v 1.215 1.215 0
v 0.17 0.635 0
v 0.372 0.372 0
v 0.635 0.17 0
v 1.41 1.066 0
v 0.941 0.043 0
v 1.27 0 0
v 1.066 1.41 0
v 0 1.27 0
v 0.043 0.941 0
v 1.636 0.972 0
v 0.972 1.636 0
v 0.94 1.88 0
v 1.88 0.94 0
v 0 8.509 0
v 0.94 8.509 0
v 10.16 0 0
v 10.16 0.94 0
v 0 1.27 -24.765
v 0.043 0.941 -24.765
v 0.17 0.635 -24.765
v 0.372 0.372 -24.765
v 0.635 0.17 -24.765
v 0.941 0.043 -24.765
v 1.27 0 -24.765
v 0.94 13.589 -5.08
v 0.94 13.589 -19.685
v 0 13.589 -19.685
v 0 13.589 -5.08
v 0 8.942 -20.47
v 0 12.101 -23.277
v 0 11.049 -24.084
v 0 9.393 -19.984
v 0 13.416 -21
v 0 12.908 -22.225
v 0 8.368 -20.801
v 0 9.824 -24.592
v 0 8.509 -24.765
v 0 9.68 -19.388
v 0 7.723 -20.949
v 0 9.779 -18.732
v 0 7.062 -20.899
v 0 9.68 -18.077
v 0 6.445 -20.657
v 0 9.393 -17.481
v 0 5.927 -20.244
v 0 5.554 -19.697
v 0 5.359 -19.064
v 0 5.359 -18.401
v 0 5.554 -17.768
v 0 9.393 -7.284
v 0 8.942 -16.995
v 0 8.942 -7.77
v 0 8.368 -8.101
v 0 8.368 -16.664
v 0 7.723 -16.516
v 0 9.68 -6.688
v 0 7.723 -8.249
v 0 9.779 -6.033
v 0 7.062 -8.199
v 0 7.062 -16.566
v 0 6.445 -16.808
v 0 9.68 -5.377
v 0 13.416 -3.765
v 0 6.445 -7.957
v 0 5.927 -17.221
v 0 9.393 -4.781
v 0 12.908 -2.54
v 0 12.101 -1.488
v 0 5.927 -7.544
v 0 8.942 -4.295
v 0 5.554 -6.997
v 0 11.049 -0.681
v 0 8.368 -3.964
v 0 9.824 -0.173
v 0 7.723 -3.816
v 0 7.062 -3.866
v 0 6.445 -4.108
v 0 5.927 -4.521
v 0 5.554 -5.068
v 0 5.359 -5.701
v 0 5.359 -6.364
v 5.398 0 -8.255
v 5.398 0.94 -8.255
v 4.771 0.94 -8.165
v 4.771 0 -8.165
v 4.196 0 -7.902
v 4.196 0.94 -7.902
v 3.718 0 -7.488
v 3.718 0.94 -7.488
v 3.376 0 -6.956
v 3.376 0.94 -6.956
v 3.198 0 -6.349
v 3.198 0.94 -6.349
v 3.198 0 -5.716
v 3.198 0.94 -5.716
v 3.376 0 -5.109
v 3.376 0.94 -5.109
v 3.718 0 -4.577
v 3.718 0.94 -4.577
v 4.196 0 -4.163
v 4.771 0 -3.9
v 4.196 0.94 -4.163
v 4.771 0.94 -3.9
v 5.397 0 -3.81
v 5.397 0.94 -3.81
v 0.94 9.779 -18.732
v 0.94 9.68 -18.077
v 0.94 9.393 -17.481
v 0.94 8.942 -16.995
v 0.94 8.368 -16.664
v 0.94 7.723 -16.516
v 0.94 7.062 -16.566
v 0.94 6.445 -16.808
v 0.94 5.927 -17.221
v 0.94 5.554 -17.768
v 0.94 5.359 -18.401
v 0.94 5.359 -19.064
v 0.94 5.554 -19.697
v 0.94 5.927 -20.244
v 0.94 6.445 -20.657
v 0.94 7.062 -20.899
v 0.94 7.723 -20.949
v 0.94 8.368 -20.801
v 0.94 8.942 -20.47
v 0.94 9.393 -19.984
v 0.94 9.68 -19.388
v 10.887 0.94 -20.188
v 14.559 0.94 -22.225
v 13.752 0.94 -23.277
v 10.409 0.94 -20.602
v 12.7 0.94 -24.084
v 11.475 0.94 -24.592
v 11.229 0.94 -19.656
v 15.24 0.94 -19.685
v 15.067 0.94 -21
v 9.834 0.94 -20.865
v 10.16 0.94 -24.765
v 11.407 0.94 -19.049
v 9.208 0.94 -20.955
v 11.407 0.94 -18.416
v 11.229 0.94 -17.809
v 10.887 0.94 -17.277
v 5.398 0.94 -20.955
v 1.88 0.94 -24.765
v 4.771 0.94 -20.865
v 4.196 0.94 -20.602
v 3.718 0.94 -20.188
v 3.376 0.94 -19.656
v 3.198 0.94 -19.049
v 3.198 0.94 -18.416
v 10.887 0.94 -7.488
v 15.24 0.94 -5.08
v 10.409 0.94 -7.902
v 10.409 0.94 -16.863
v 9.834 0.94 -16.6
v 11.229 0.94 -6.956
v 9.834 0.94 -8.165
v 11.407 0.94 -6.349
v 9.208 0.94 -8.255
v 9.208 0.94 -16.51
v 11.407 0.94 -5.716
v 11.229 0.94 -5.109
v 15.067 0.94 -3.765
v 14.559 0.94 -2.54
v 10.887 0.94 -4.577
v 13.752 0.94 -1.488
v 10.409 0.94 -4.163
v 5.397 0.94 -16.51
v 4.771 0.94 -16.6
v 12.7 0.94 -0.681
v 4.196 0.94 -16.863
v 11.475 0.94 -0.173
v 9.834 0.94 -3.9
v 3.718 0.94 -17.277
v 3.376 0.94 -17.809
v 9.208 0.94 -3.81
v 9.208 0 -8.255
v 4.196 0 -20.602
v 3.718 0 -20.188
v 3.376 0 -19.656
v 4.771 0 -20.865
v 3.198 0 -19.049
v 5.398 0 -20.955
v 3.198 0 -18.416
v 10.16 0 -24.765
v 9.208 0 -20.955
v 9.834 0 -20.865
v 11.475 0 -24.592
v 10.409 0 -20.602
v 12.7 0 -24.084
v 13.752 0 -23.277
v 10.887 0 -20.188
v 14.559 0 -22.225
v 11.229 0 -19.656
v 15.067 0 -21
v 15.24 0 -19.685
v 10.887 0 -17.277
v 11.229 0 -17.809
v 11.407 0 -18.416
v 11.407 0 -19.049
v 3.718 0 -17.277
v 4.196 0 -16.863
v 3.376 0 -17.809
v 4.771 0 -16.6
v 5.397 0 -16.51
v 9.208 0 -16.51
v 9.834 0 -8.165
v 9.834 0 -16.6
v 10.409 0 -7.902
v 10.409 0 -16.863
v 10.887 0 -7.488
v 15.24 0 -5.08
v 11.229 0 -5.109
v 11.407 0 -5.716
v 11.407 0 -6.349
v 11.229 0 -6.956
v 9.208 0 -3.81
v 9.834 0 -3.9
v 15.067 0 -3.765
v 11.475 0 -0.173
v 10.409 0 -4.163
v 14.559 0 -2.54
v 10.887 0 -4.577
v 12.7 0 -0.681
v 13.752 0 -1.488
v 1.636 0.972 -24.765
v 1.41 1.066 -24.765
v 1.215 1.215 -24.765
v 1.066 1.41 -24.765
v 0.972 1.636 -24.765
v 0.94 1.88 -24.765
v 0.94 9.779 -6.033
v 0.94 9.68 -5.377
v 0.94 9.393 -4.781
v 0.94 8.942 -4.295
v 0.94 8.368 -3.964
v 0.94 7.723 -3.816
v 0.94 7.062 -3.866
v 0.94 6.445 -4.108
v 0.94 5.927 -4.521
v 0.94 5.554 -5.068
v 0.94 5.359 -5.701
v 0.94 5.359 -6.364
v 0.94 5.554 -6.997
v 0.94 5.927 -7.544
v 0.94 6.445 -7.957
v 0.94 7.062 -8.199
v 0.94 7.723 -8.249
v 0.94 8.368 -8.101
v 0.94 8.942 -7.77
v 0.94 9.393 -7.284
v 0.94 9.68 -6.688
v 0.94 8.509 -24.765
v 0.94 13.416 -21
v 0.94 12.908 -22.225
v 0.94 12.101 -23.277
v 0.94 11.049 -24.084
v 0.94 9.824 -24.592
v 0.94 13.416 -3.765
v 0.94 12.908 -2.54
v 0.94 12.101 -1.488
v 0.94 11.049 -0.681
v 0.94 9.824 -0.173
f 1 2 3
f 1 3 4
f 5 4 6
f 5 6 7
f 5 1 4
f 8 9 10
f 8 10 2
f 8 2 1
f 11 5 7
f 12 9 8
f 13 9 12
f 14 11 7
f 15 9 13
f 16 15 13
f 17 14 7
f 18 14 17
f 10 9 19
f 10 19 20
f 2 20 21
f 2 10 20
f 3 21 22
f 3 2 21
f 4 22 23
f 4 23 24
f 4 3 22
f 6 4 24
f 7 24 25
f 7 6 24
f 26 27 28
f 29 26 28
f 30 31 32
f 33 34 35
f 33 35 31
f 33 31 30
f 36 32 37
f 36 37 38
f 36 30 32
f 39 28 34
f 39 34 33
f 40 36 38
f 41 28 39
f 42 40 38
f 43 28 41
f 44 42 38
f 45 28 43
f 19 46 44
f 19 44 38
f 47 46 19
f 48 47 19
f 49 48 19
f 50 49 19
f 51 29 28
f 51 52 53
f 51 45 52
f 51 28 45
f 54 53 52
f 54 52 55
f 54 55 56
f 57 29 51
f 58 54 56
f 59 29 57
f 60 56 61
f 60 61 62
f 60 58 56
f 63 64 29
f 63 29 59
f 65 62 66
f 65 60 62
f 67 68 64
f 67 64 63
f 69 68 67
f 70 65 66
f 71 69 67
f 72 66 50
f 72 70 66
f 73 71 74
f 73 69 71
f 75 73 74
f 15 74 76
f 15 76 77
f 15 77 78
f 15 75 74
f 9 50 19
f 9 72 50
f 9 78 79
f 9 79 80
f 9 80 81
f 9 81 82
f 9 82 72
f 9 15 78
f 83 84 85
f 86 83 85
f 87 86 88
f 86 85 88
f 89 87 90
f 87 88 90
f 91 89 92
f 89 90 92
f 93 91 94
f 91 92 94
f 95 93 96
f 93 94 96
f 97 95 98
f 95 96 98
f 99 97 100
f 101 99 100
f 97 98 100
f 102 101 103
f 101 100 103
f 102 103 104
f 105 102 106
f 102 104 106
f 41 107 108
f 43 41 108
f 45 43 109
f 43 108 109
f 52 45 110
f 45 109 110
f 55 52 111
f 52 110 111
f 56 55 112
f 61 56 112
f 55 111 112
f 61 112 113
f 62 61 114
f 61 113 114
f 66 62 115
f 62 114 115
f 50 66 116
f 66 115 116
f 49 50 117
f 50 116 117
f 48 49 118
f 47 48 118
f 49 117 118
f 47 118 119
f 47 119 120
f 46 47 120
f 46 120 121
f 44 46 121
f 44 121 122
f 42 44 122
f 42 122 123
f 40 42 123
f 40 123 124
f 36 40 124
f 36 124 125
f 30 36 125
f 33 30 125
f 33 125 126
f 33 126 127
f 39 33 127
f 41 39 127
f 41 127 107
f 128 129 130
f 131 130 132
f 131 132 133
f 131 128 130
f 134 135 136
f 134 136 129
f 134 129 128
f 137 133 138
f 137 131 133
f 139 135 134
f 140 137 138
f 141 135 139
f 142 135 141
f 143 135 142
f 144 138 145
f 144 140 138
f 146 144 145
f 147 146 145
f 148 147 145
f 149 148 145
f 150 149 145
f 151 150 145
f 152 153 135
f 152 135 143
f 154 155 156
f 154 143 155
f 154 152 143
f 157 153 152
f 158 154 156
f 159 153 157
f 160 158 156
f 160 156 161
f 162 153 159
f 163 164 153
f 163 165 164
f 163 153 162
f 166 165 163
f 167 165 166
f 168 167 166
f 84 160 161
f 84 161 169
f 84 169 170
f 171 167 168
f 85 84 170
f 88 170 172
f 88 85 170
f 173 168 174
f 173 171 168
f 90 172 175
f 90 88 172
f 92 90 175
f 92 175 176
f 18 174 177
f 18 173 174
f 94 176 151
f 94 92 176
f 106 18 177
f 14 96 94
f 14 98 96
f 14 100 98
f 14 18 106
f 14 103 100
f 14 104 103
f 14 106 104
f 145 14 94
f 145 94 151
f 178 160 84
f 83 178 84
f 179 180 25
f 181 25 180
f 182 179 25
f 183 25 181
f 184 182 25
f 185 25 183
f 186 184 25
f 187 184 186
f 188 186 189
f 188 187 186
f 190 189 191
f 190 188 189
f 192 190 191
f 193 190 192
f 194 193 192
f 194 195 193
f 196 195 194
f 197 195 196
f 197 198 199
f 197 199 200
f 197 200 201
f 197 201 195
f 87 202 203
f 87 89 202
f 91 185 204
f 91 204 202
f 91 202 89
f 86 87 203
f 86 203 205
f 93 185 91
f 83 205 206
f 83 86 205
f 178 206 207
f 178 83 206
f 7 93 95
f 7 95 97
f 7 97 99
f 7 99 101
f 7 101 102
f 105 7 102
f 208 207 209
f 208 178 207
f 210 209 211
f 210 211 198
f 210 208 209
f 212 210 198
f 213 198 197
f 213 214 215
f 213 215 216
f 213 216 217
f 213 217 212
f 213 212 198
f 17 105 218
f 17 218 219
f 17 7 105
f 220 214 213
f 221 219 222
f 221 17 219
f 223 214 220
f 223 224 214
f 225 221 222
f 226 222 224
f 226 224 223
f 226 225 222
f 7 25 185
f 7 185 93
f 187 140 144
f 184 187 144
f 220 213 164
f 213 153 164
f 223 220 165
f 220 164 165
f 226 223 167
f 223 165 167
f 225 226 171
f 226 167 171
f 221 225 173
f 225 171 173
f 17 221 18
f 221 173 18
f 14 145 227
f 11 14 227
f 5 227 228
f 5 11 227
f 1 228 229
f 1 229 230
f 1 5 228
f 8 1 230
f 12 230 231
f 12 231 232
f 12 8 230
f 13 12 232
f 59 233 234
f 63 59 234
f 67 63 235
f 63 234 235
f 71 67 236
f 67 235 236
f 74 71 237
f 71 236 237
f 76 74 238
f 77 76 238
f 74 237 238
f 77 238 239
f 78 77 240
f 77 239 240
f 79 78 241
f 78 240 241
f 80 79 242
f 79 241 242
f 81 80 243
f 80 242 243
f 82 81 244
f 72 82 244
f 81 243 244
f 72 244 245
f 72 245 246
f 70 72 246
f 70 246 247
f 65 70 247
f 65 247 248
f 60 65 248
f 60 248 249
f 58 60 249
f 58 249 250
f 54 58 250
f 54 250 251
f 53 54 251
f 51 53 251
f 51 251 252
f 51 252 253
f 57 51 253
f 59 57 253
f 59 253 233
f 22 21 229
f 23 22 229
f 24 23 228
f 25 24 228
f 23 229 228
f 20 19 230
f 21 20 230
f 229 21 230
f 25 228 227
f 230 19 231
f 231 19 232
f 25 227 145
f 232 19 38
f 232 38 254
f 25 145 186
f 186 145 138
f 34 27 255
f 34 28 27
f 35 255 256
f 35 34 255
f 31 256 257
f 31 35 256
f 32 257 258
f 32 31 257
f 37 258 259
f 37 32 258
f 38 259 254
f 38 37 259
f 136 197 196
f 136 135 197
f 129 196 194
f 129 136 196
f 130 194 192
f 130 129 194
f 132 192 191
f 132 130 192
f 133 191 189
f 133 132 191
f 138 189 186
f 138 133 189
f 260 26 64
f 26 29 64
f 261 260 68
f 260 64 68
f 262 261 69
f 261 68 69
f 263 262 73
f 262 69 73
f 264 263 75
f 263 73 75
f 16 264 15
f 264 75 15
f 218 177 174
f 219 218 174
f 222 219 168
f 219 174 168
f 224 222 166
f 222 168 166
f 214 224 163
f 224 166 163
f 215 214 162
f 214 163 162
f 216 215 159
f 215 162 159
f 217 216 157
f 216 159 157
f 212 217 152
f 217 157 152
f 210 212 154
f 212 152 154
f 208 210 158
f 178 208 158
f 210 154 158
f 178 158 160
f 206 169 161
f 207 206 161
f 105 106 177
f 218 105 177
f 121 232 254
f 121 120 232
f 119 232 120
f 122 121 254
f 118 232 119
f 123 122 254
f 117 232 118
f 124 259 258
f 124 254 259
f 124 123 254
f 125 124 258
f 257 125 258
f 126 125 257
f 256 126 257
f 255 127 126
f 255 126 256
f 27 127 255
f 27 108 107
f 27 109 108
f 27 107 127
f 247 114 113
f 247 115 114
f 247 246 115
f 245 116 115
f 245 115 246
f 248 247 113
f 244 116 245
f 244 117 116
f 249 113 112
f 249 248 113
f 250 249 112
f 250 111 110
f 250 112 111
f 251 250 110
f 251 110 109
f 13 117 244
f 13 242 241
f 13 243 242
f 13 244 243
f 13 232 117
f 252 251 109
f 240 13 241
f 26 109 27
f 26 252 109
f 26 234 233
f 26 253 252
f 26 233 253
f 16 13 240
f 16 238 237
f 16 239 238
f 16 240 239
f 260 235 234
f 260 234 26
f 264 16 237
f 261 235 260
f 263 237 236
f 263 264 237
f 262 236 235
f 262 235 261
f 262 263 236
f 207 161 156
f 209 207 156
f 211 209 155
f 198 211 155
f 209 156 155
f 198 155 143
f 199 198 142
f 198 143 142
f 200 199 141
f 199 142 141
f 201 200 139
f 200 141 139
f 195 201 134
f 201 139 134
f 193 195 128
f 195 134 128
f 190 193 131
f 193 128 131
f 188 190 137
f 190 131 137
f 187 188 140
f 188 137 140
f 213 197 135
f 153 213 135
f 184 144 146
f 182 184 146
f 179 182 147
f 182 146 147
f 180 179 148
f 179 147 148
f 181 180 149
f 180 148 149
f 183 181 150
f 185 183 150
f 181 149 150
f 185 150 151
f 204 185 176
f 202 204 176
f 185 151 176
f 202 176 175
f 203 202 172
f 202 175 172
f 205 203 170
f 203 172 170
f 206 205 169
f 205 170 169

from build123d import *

# Parameters (mm, degrees)
ANGLE_BRACKET_DEPTH = 24.765
CORNERS_R           = 5.08
SKETCH2_R           = 2.2225
HOLES_DEPTH         = 32.661678194
SLOTS_DEPTH         = 32.710646251


with BuildPart() as part:
    # Sketch1 → Angle Bracket (new body)
    with BuildSketch(Plane.XY):
        with BuildLine():
            Line((0, 13.589), (0, 1.27))
            ThreePointArc((0, 1.27), (0.371974388, 0.371974388), (1.27, 0))
            Line((1.27, 0), (15.24, 0))
            Line((15.24, 0), (15.24, 0.9398))
            Line((15.24, 0.9398), (1.8796, 0.9398))
            ThreePointArc((1.8796, 0.9398), (1.215061047, 1.215061047), (0.9398, 1.8796))
            Line((0.9398, 1.8796), (0.9398, 13.589))
            Line((0.9398, 13.589), (0, 13.589))
        make_face()
    extrude(amount=-ANGLE_BRACKET_DEPTH)

    # Corners
    corners_edges = [part.edges().sort_by_distance(p)[0] for p in [
        (0.4699, 13.589, 0),
        (15.24, 0.4699, -24.765),
        (0.4699, 13.589, -24.765),
        (15.24, 0.4699, 0),
    ]]
    fillet(corners_edges, radius=CORNERS_R)

    # Sketch2 → Holes (cut, through all)
    with BuildSketch(Plane(origin=(0.9398, 0, 0), x_dir=(0, 0, -1), z_dir=(1, 0, 0))):
        with Locations(Location((6.0325, 7.5565, 0), (0, 0, 90))):
            Circle(SKETCH2_R)
        with Locations(Location((18.7325, 7.5565, 0), (0, 0, 90))):
            Circle(SKETCH2_R)
    extrude(amount=-HOLES_DEPTH, mode=Mode.SUBTRACT)

    # Sketch3 → Slots (cut, through all)
    with BuildSketch(Plane(origin=(0, 0.9398, 0), x_dir=(-1, 0, 0), z_dir=(0, 1, 0))):
        with BuildLine():
            Line((-5.3975, -3.81), (-9.2075, -3.81))
            ThreePointArc((-9.2075, -3.81), (-11.43, -6.0325), (-9.2075, -8.255))
            Line((-9.2075, -8.255), (-5.3975, -8.255))
            ThreePointArc((-5.3975, -8.255), (-3.175, -6.0325), (-5.3975, -3.81))
        make_face()
        with BuildLine():
            Line((-5.3975, -16.51), (-9.2075, -16.51))
            ThreePointArc((-9.2075, -16.51), (-11.43, -18.7325), (-9.2075, -20.955))
            Line((-9.2075, -20.955), (-5.3975, -20.955))
            ThreePointArc((-5.3975, -20.955), (-3.175, -18.7325), (-5.3975, -16.51))
        make_face()
    extrude(amount=-SLOTS_DEPTH, mode=Mode.SUBTRACT)


solid = part.part
